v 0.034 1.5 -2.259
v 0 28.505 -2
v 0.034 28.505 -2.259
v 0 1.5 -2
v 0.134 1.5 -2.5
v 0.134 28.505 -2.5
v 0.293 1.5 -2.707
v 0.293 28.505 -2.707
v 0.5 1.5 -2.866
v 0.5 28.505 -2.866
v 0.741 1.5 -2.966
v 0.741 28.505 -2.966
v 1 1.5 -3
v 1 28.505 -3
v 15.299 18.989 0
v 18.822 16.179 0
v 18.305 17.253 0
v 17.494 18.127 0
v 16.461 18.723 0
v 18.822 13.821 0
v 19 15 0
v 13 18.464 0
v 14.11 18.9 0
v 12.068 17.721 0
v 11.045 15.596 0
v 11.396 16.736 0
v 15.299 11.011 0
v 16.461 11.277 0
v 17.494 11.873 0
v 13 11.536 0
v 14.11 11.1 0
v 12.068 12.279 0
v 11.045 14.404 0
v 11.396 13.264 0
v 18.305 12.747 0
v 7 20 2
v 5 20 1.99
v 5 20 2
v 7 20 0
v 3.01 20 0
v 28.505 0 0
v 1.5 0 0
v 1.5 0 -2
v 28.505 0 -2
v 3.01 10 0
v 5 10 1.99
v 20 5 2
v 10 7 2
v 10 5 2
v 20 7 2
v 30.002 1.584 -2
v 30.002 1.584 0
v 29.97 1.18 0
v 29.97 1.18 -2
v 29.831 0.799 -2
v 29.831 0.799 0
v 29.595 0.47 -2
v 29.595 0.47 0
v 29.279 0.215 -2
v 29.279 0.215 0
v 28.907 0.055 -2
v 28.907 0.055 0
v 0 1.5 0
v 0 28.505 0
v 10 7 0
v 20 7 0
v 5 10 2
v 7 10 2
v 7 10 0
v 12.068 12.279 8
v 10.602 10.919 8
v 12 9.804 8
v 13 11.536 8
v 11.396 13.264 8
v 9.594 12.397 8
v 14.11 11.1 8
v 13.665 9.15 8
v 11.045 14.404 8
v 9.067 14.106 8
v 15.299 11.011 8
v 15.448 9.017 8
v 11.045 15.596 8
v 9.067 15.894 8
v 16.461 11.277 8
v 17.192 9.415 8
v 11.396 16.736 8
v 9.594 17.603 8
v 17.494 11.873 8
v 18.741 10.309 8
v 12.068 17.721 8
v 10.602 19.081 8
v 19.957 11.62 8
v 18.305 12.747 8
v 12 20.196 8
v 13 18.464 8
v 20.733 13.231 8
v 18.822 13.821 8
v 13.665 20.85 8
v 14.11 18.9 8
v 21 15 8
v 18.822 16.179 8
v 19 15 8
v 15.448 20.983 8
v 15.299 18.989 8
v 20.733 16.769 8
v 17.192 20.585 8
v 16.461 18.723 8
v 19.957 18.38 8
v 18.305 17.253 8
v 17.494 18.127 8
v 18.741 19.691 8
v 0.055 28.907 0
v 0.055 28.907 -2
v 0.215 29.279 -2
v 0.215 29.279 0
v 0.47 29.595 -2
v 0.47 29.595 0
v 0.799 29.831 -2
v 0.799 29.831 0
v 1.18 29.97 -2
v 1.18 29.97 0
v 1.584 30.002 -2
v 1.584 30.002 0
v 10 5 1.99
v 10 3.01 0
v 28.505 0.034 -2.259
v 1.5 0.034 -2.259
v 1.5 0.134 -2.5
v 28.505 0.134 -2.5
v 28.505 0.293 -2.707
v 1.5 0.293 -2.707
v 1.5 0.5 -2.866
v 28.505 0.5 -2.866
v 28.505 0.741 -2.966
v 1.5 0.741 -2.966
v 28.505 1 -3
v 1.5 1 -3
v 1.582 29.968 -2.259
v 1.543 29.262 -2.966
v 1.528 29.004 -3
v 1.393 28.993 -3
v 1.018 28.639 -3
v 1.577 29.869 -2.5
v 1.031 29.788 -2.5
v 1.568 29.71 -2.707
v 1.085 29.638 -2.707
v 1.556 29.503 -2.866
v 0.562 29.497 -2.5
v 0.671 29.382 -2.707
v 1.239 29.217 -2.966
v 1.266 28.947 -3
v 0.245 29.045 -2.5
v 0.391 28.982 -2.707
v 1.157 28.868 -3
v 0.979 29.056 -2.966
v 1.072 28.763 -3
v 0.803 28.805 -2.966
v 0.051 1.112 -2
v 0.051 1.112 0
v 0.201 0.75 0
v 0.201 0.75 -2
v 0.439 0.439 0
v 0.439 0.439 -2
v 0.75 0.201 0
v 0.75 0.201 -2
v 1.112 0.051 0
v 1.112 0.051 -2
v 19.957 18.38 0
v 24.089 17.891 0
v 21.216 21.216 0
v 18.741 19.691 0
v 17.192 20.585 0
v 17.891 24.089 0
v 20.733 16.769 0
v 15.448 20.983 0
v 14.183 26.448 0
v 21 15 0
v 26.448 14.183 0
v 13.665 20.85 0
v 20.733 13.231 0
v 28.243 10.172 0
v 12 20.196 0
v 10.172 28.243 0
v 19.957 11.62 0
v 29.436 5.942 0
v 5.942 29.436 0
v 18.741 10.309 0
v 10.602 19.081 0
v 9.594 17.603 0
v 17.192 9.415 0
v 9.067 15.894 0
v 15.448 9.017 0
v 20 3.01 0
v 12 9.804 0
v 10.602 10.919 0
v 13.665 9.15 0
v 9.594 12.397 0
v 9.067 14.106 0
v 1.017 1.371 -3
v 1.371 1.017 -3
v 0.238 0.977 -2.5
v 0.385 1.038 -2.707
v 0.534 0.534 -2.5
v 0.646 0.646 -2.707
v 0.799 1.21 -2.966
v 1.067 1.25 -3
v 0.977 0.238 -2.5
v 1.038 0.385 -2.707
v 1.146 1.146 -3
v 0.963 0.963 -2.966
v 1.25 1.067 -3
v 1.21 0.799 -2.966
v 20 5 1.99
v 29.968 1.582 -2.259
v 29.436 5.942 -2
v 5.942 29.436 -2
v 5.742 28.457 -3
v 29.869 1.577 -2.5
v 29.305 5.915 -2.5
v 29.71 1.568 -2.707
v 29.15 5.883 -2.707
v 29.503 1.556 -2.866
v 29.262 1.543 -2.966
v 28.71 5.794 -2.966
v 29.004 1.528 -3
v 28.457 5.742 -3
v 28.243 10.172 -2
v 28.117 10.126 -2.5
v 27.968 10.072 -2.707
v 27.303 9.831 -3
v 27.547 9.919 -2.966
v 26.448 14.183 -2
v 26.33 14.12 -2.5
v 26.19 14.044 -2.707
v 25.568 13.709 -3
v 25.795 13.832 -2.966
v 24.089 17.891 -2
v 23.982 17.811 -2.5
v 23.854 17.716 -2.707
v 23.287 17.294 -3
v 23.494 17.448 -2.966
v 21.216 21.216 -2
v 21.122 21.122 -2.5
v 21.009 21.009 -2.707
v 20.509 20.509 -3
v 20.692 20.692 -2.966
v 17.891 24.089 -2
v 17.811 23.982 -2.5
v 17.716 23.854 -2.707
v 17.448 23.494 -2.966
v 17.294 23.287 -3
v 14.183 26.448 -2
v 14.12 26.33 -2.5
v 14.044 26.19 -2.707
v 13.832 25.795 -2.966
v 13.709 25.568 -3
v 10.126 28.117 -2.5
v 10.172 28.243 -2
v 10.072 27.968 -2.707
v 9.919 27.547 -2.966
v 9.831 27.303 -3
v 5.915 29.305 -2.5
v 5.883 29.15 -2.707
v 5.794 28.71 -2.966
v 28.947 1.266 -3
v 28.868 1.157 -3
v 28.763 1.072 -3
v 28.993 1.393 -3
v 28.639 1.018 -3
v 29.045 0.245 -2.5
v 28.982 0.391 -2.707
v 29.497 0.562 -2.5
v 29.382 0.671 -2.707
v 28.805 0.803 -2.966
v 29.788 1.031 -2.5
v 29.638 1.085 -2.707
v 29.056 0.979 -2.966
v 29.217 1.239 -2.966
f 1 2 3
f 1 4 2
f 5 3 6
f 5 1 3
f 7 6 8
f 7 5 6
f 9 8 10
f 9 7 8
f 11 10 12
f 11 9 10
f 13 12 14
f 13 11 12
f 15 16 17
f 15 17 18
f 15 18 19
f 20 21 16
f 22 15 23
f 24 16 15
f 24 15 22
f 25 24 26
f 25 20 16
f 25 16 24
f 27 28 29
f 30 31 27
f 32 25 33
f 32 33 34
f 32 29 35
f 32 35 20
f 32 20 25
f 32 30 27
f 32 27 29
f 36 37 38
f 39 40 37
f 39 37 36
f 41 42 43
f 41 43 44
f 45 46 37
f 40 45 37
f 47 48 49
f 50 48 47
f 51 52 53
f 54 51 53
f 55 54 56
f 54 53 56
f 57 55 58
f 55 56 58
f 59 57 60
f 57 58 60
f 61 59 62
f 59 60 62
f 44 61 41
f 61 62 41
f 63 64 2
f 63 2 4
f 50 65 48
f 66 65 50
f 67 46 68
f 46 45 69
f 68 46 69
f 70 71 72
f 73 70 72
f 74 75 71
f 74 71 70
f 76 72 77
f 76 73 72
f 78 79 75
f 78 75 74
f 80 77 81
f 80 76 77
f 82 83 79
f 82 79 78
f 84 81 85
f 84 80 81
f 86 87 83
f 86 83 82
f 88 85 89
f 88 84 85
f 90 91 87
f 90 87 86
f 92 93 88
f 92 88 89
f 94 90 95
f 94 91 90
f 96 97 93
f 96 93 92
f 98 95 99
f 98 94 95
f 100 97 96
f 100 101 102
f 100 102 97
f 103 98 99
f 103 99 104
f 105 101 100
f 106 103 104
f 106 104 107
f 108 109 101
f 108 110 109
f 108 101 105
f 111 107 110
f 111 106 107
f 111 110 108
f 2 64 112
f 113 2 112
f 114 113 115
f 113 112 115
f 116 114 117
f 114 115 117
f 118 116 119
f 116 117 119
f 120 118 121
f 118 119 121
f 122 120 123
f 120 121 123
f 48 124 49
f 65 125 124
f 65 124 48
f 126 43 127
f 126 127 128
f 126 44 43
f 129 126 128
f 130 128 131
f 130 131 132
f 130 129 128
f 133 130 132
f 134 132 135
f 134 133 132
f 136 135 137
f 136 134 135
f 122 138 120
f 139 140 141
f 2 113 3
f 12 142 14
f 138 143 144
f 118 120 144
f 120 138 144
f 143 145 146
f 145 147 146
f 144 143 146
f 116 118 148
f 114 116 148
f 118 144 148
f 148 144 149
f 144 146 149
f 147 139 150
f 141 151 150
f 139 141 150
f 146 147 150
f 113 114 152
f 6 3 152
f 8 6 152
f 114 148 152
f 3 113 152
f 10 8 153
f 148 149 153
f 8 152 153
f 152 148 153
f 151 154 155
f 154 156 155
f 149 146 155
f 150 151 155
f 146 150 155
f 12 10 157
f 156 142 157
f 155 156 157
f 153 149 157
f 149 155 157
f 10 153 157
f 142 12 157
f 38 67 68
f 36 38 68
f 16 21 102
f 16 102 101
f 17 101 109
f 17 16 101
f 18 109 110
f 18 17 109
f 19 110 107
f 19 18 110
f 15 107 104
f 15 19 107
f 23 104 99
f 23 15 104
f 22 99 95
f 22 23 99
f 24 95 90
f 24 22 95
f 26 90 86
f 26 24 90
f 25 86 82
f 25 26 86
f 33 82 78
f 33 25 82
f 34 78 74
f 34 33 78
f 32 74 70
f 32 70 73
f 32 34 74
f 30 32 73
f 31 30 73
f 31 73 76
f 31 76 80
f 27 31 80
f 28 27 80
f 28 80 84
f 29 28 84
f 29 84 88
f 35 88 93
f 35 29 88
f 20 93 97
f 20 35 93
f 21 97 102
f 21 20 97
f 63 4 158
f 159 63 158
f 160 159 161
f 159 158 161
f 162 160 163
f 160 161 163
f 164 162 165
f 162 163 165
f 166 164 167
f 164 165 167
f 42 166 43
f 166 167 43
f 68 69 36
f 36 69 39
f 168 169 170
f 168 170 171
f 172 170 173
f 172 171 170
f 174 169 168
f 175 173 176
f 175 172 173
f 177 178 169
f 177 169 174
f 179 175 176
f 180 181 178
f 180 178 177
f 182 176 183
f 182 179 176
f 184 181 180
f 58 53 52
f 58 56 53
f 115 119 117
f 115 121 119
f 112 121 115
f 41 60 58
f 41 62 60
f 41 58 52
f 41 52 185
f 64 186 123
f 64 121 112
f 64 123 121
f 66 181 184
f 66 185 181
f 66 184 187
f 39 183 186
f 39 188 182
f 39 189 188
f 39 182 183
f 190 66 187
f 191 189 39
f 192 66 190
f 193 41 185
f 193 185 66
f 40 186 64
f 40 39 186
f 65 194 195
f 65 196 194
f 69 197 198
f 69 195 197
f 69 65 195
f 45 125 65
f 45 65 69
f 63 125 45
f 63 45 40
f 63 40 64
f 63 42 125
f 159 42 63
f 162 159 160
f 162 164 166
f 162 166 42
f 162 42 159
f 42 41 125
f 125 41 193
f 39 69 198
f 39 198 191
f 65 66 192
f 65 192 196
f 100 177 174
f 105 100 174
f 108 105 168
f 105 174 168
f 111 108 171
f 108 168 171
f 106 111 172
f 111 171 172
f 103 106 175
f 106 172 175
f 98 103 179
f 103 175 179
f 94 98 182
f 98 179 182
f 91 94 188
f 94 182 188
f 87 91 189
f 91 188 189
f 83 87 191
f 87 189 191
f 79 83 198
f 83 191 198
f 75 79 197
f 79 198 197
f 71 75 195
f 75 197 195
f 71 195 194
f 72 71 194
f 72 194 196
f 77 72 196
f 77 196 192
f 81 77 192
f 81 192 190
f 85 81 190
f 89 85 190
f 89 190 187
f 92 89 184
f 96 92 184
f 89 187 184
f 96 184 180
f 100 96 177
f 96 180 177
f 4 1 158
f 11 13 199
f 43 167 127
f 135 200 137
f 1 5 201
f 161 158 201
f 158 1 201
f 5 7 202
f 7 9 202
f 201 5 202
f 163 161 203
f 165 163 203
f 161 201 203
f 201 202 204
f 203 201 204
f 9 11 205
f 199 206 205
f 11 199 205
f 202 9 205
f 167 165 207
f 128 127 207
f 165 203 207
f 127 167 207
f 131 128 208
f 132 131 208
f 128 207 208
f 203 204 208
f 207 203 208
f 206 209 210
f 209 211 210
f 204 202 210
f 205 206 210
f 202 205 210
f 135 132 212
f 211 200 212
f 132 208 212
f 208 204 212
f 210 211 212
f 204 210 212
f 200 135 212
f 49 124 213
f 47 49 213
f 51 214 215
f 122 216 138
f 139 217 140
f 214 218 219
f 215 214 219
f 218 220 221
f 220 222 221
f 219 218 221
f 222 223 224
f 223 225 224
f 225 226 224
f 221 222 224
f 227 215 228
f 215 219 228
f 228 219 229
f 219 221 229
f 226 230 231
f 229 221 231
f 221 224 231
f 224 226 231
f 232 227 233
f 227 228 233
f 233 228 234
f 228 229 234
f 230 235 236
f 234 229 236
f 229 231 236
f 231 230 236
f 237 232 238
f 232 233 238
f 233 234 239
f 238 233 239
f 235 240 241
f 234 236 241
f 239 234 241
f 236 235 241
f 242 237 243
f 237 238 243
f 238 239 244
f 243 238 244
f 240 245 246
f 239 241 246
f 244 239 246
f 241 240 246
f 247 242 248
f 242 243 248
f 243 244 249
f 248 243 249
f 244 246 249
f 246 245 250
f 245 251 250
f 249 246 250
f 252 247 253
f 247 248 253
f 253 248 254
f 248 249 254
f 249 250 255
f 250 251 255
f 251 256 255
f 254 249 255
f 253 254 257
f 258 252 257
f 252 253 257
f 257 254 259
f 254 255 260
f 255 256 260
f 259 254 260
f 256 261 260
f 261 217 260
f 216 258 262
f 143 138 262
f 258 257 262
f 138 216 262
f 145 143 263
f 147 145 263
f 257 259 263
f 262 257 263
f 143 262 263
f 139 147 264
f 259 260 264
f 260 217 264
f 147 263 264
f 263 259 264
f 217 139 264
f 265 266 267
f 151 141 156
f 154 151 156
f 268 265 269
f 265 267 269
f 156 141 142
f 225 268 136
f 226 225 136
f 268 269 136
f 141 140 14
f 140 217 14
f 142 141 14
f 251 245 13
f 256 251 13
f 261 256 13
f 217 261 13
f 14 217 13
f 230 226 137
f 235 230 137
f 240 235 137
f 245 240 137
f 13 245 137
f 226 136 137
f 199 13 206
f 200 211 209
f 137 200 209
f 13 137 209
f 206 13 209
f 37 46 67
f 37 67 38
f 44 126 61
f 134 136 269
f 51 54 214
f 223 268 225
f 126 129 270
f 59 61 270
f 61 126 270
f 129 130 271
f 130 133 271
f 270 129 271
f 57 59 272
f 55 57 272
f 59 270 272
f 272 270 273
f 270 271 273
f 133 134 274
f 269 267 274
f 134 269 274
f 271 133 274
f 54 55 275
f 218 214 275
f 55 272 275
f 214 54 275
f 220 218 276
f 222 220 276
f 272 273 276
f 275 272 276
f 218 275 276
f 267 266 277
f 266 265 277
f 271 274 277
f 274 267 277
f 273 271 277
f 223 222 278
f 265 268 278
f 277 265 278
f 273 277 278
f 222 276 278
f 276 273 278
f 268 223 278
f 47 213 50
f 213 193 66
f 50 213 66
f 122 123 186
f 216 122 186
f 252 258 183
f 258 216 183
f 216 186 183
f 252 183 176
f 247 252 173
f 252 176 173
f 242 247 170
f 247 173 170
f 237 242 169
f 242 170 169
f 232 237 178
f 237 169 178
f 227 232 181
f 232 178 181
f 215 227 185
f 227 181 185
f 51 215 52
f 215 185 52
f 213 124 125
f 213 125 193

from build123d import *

# Parameters (mm, degrees)
SKETCH_R      = 6
SKETCH_R_2    = 4
PAD_DEPTH     = 8
PAD001_DEPTH  = 3
FILLET_R      = 1.5
FILLET001_R   = 1
SKETCH002_W   = 2
SKETCH002_H   = 10
SKETCH002_W_2 = 10
SKETCH002_H_2 = 2
PAD002_DEPTH  = 2
CHAMFER_SIZE  = 1.99


with BuildPart() as part:
    # Sketch → Pad (new body)
    with BuildSketch(Plane.XY):
        with Locations((15, 15)):
            Circle(SKETCH_R)
        with Locations((15, 15)):
            Circle(SKETCH_R_2, mode=Mode.SUBTRACT)
    extrude(amount=PAD_DEPTH)

    # Sketch001 (on Face3 of Pad) → Pad001 (join)
    with BuildSketch(Plane(origin=(0, 0, 0), x_dir=(1, 0, 0), z_dir=(0, 0, -1))):
        with BuildLine():
            Line((0, -28.504743), (0, 0))
            Line((0, 0), (28.504743, 0))
            ThreePointArc((30.002374, -1.584264), (29.594788, -0.469562), (28.504743, 0))
            ThreePointArc((1.584264, -30.002374), (21.216341, -21.216341), (30.002374, -1.584264))
            ThreePointArc((0, -28.504743), (0.469562, -29.594788), (1.584264, -30.002374))
        make_face()
    extrude(amount=PAD001_DEPTH)

    # Fillet
    fillet_edges = [part.edges().sort_by_distance(p)[0] for p in [
        (0, 0, -1.5),
    ]]
    fillet(fillet_edges, radius=FILLET_R)

    # Fillet001
    fillet001_edges = [part.edges().sort_by_distance(p)[0] for p in [
        (0, 15.002371, -3),
        (0.43934, 0.43934, -3),
        (0.469562, 29.594788, -3),
        (15.002371, 0, -3),
        (21.216341, 21.216341, -3),
        (29.594788, 0.469562, -3),
    ]]
    fillet(fillet001_edges, radius=FILLET001_R)

    # Sketch002 (on Face4 of Fillet001) → Pad002 (join)
    with BuildSketch(Plane.XY):
        with Locations((6, 15)):
            Rectangle(SKETCH002_W, SKETCH002_H)
        with Locations((15, 6)):
            Rectangle(SKETCH002_W_2, SKETCH002_H_2)
    extrude(amount=PAD002_DEPTH)

    # Chamfer
    chamfer_edges = [part.edges().sort_by_distance(p)[0] for p in [
        (5, 15, 0),
        (15, 5, 0),
    ]]
    chamfer(chamfer_edges, length=CHAMFER_SIZE)


solid = part.part
